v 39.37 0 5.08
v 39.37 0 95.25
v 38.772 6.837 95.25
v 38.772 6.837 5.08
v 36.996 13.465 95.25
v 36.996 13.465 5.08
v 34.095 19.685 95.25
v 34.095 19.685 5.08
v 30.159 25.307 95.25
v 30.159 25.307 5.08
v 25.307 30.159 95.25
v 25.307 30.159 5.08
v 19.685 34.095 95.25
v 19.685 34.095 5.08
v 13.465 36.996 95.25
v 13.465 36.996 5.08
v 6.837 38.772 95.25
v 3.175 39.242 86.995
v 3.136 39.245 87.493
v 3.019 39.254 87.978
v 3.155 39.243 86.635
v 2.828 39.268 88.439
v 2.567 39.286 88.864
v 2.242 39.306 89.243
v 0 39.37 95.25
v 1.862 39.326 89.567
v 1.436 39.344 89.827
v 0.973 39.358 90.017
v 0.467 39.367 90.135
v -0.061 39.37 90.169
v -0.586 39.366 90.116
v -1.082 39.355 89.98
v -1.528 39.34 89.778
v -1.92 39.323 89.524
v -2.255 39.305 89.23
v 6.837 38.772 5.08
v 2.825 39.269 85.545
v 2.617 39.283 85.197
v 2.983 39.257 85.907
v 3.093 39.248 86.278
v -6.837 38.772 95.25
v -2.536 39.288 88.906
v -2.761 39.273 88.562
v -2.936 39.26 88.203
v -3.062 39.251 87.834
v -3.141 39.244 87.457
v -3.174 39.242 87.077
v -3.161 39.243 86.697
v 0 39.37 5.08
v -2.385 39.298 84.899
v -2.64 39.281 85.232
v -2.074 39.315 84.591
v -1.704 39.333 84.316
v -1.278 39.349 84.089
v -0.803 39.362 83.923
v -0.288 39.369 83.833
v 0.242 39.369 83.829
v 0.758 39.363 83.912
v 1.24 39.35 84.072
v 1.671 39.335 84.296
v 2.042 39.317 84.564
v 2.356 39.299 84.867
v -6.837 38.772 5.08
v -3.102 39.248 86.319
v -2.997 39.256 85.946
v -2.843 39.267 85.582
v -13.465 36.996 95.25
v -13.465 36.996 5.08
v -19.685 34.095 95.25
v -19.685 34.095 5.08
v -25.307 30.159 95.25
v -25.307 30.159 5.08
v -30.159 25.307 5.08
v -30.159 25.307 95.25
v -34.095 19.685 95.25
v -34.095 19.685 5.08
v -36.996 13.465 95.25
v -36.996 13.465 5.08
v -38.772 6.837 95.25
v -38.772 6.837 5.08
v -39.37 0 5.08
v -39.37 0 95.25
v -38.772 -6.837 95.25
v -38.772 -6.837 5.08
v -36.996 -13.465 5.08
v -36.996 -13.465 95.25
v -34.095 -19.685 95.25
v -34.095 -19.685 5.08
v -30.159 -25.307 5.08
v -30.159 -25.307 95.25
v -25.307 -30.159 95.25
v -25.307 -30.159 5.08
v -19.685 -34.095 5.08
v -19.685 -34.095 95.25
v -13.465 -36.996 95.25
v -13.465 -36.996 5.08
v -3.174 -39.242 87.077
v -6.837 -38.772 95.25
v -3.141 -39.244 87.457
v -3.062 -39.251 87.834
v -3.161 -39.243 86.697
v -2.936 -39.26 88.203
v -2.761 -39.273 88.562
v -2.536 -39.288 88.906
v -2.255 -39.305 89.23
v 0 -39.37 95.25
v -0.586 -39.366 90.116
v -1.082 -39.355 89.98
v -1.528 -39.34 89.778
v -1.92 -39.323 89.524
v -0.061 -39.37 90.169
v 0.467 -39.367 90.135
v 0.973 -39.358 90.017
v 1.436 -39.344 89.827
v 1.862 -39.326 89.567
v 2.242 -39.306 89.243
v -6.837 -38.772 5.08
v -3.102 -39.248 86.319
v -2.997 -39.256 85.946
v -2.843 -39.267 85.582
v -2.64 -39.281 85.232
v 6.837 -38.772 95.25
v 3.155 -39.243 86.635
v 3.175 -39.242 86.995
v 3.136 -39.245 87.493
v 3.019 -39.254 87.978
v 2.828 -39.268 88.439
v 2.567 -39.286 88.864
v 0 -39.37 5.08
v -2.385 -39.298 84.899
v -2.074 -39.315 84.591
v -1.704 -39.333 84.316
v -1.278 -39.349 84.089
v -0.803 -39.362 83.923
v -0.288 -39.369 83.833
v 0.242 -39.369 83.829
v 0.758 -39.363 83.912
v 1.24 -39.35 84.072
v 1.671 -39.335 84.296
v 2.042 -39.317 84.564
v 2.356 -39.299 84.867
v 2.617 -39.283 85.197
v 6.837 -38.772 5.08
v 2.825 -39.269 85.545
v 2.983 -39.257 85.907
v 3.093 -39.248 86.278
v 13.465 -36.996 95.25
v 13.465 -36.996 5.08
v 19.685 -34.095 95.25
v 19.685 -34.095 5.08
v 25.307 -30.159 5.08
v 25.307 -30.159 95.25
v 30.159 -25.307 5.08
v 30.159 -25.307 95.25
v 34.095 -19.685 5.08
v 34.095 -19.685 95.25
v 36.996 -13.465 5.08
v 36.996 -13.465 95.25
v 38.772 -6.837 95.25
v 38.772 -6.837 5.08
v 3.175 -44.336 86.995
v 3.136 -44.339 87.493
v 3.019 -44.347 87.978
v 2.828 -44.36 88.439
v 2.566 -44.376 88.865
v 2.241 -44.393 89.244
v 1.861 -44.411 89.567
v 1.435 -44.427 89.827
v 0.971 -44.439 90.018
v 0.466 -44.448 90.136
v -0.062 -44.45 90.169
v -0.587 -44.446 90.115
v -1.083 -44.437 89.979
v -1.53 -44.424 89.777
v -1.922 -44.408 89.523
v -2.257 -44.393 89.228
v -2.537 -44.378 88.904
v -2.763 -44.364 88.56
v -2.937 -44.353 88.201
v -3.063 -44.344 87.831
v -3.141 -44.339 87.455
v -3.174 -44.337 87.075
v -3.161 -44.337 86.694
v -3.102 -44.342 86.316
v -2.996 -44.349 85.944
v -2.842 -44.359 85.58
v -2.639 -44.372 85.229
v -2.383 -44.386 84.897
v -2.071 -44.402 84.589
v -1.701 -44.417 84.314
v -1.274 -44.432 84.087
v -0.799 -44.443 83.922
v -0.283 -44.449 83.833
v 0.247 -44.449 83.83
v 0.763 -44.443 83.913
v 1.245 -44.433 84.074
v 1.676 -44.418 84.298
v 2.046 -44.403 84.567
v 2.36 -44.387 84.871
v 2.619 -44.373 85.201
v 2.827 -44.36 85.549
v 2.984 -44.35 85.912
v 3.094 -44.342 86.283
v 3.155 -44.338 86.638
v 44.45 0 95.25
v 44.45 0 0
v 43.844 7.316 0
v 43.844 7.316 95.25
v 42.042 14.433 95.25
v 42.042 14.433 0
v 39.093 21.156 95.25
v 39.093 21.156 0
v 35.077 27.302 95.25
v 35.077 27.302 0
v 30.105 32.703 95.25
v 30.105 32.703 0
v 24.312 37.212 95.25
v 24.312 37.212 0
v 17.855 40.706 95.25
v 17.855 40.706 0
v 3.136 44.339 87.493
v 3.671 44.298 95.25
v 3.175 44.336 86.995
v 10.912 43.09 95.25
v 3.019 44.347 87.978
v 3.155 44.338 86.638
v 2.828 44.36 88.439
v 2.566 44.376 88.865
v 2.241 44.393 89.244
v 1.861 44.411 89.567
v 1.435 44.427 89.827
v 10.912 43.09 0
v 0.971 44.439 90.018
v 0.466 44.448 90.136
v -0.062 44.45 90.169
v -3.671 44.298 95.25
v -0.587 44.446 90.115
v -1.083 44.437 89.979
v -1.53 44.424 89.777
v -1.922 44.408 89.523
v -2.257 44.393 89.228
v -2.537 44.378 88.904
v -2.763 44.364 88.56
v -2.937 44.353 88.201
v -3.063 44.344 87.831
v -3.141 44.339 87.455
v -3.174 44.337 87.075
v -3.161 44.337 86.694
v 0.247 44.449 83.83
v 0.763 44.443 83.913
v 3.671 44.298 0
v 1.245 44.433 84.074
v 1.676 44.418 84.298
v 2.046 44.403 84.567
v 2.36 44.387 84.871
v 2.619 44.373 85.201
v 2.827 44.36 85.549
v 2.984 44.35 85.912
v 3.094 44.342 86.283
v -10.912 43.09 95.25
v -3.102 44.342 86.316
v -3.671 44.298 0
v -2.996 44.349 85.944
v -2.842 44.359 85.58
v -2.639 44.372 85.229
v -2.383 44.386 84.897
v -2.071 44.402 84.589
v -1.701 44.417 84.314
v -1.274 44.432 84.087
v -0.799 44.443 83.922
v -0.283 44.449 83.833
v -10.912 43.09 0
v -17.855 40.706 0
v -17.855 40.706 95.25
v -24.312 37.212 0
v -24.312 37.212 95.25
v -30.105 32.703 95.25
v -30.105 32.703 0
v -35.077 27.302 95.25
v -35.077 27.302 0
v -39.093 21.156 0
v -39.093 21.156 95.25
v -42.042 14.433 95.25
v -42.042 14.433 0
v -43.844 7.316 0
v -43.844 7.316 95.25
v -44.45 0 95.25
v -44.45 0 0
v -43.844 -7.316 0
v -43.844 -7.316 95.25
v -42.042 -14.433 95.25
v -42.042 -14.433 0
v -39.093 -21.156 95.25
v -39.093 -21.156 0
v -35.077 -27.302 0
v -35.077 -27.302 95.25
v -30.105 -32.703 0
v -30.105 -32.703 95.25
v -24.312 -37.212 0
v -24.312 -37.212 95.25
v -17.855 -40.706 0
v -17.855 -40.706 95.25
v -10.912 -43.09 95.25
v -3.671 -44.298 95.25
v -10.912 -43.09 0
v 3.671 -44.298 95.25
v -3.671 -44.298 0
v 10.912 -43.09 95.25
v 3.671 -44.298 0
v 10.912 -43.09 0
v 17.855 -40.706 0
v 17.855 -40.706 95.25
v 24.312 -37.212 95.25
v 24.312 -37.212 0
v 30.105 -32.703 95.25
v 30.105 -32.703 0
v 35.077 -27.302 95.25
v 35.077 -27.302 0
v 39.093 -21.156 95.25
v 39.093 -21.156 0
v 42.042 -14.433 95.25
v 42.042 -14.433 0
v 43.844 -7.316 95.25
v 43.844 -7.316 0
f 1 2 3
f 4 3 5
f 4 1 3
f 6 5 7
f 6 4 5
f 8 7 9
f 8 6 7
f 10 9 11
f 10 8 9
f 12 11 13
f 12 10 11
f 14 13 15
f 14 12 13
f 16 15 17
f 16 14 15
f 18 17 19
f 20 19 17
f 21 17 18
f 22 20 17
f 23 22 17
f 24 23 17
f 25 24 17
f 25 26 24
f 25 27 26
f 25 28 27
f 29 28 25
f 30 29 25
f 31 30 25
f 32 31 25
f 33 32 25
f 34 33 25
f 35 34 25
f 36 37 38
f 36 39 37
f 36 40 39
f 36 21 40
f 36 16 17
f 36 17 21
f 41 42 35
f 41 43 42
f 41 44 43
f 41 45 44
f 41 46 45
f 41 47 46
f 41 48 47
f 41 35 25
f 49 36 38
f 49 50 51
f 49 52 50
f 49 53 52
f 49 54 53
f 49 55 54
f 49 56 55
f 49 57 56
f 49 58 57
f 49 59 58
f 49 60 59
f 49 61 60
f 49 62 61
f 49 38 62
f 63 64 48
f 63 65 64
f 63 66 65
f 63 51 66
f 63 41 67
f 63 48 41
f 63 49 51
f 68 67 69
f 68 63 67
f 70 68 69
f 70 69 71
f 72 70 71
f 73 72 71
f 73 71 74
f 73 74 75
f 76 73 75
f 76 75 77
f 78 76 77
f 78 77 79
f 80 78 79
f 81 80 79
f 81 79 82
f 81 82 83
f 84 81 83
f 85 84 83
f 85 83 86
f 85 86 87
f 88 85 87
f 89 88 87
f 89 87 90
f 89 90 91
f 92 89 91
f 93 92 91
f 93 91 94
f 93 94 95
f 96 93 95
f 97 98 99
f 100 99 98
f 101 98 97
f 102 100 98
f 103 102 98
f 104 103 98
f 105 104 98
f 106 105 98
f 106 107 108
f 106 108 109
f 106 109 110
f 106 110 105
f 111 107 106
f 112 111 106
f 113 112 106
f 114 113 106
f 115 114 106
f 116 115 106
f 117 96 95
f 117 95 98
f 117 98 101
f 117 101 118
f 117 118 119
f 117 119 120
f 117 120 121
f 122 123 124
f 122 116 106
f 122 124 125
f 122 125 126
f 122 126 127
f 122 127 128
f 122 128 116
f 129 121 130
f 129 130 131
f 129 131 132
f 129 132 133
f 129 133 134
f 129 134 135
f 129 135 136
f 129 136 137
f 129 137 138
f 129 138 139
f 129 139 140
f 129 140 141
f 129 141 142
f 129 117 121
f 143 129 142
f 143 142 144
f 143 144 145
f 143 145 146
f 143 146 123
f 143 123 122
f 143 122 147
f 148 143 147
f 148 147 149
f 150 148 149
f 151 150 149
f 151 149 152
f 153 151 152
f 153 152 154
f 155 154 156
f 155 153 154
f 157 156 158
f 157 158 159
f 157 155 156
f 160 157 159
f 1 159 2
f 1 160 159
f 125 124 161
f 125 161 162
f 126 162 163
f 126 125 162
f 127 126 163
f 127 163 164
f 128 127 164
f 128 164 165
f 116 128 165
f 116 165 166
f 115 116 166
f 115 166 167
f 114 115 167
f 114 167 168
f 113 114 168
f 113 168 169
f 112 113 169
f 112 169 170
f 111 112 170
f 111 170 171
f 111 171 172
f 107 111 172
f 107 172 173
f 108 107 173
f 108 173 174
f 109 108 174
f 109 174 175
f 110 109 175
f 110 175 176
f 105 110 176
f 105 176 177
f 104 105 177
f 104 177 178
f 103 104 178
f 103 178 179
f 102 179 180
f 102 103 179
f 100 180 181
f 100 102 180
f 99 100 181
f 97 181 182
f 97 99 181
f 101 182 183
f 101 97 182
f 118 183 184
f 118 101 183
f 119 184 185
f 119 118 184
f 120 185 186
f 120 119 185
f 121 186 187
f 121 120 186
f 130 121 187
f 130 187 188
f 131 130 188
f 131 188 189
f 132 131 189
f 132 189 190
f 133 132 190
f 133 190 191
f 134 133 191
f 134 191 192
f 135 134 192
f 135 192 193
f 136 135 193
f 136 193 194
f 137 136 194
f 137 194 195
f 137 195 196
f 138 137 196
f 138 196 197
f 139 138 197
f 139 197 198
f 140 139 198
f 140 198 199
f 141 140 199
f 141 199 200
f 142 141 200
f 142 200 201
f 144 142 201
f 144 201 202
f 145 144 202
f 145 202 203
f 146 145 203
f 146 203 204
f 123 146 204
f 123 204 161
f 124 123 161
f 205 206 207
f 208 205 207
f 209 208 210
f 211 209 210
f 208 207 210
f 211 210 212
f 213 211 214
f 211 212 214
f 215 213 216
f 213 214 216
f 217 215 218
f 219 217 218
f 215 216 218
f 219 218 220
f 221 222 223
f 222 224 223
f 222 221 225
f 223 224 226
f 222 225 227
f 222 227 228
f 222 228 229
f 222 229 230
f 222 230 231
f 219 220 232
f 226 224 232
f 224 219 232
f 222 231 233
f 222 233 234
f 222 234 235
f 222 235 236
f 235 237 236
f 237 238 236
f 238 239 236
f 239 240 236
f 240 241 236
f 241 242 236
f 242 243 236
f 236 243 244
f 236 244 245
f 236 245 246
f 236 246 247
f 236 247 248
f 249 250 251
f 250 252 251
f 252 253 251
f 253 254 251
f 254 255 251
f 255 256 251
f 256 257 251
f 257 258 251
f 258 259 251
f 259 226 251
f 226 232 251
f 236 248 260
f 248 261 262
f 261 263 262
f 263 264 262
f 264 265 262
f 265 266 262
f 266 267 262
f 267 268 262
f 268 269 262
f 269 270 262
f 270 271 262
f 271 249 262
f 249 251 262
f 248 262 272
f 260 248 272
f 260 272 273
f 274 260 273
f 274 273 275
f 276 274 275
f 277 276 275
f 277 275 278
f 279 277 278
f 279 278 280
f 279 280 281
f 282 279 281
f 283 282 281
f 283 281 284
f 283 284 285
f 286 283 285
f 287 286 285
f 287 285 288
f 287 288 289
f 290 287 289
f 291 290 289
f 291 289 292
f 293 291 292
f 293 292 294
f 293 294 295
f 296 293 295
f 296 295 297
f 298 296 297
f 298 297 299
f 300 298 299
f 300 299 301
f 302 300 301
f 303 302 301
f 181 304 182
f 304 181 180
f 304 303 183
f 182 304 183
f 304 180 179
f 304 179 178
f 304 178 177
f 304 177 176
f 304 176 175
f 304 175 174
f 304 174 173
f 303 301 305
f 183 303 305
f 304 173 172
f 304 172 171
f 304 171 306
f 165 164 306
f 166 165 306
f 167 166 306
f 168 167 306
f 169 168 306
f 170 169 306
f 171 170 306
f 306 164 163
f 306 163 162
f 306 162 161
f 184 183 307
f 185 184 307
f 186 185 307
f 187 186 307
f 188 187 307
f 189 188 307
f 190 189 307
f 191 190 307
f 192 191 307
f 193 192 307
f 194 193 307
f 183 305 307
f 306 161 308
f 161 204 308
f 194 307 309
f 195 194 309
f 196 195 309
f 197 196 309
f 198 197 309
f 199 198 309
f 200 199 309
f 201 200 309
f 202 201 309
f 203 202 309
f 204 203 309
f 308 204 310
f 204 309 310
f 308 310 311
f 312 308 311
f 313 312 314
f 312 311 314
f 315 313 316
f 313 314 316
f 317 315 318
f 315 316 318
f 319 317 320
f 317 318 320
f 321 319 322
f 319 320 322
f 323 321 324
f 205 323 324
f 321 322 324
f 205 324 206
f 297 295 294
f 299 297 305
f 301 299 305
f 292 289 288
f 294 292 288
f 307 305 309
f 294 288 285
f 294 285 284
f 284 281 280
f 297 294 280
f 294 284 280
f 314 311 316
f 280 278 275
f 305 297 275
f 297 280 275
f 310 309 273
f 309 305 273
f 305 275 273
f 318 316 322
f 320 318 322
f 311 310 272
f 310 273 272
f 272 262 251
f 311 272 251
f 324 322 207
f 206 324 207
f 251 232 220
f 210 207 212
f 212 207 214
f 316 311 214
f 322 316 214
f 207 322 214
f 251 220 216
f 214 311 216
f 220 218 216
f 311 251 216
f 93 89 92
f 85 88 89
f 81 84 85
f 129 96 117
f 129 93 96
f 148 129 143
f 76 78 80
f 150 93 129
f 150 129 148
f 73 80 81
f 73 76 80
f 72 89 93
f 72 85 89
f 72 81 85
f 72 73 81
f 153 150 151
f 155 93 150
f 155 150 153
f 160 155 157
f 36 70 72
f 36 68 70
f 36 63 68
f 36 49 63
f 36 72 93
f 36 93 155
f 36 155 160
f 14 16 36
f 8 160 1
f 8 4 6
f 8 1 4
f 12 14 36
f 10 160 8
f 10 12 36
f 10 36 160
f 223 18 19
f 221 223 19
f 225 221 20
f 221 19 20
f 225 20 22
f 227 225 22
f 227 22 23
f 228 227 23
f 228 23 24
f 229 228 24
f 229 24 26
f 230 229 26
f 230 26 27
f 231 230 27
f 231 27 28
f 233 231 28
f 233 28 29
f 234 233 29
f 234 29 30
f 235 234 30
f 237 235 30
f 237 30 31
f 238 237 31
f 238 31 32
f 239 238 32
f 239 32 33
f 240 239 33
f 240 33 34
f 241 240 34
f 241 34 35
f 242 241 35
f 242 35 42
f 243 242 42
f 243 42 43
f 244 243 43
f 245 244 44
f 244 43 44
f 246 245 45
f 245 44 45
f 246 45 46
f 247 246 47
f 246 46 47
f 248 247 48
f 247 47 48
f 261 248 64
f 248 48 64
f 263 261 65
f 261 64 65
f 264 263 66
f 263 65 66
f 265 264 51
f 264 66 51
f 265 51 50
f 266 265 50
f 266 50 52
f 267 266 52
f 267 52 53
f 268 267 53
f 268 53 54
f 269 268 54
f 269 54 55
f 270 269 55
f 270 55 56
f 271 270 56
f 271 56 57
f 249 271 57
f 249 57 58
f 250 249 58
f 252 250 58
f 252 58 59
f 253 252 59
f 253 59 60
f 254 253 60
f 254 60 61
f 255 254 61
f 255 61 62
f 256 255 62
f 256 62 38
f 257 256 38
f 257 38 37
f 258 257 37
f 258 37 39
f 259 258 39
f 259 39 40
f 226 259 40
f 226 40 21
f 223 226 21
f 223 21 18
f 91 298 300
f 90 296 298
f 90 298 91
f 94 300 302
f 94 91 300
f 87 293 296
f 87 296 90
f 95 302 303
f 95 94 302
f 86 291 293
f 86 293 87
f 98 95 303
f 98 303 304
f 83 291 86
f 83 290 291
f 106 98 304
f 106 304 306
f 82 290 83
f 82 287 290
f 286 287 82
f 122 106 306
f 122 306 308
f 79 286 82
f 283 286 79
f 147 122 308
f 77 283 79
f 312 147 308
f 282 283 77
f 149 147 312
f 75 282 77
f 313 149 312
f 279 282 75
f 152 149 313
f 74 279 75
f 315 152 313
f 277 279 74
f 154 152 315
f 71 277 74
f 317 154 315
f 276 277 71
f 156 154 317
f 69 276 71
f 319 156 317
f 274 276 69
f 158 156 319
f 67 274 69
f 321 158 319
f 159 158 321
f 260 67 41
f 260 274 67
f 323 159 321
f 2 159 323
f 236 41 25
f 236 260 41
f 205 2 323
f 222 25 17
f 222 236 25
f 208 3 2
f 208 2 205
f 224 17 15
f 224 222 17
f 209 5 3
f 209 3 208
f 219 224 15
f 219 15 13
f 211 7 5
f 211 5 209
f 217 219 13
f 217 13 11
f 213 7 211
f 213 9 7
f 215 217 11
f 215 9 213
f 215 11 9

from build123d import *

# Parameters (mm, degrees)
F0_R          = 44.45
F1_DEPTH      = 95.25
F2_T          = -5.08
F3_R          = 3.175
F4_DEPTH      = 44.451
F4_DEPTH_BACK = 44.451


with BuildPart() as f1:
    # F0 (on Top) → F1 (new body)
    with BuildSketch(Plane.XY):
        Circle(F0_R)
    extrude(amount=F1_DEPTH)

    # F2
    f2_openings = [f1.faces().sort_by_distance(p)[0] for p in [
        (0, 0, 95.25),
    ]]
    offset(amount=F2_T, openings=f2_openings)

    # F3 (on Front) → F4 (cut, two sides)
    with BuildSketch(Plane.XZ) as f4_sk:
        with Locations((0, 86.995)):
            Circle(F3_R)
    extrude(amount=-F4_DEPTH, mode=Mode.SUBTRACT)
    extrude(f4_sk.sketch, amount=F4_DEPTH_BACK, mode=Mode.SUBTRACT)


solid = f1.part
